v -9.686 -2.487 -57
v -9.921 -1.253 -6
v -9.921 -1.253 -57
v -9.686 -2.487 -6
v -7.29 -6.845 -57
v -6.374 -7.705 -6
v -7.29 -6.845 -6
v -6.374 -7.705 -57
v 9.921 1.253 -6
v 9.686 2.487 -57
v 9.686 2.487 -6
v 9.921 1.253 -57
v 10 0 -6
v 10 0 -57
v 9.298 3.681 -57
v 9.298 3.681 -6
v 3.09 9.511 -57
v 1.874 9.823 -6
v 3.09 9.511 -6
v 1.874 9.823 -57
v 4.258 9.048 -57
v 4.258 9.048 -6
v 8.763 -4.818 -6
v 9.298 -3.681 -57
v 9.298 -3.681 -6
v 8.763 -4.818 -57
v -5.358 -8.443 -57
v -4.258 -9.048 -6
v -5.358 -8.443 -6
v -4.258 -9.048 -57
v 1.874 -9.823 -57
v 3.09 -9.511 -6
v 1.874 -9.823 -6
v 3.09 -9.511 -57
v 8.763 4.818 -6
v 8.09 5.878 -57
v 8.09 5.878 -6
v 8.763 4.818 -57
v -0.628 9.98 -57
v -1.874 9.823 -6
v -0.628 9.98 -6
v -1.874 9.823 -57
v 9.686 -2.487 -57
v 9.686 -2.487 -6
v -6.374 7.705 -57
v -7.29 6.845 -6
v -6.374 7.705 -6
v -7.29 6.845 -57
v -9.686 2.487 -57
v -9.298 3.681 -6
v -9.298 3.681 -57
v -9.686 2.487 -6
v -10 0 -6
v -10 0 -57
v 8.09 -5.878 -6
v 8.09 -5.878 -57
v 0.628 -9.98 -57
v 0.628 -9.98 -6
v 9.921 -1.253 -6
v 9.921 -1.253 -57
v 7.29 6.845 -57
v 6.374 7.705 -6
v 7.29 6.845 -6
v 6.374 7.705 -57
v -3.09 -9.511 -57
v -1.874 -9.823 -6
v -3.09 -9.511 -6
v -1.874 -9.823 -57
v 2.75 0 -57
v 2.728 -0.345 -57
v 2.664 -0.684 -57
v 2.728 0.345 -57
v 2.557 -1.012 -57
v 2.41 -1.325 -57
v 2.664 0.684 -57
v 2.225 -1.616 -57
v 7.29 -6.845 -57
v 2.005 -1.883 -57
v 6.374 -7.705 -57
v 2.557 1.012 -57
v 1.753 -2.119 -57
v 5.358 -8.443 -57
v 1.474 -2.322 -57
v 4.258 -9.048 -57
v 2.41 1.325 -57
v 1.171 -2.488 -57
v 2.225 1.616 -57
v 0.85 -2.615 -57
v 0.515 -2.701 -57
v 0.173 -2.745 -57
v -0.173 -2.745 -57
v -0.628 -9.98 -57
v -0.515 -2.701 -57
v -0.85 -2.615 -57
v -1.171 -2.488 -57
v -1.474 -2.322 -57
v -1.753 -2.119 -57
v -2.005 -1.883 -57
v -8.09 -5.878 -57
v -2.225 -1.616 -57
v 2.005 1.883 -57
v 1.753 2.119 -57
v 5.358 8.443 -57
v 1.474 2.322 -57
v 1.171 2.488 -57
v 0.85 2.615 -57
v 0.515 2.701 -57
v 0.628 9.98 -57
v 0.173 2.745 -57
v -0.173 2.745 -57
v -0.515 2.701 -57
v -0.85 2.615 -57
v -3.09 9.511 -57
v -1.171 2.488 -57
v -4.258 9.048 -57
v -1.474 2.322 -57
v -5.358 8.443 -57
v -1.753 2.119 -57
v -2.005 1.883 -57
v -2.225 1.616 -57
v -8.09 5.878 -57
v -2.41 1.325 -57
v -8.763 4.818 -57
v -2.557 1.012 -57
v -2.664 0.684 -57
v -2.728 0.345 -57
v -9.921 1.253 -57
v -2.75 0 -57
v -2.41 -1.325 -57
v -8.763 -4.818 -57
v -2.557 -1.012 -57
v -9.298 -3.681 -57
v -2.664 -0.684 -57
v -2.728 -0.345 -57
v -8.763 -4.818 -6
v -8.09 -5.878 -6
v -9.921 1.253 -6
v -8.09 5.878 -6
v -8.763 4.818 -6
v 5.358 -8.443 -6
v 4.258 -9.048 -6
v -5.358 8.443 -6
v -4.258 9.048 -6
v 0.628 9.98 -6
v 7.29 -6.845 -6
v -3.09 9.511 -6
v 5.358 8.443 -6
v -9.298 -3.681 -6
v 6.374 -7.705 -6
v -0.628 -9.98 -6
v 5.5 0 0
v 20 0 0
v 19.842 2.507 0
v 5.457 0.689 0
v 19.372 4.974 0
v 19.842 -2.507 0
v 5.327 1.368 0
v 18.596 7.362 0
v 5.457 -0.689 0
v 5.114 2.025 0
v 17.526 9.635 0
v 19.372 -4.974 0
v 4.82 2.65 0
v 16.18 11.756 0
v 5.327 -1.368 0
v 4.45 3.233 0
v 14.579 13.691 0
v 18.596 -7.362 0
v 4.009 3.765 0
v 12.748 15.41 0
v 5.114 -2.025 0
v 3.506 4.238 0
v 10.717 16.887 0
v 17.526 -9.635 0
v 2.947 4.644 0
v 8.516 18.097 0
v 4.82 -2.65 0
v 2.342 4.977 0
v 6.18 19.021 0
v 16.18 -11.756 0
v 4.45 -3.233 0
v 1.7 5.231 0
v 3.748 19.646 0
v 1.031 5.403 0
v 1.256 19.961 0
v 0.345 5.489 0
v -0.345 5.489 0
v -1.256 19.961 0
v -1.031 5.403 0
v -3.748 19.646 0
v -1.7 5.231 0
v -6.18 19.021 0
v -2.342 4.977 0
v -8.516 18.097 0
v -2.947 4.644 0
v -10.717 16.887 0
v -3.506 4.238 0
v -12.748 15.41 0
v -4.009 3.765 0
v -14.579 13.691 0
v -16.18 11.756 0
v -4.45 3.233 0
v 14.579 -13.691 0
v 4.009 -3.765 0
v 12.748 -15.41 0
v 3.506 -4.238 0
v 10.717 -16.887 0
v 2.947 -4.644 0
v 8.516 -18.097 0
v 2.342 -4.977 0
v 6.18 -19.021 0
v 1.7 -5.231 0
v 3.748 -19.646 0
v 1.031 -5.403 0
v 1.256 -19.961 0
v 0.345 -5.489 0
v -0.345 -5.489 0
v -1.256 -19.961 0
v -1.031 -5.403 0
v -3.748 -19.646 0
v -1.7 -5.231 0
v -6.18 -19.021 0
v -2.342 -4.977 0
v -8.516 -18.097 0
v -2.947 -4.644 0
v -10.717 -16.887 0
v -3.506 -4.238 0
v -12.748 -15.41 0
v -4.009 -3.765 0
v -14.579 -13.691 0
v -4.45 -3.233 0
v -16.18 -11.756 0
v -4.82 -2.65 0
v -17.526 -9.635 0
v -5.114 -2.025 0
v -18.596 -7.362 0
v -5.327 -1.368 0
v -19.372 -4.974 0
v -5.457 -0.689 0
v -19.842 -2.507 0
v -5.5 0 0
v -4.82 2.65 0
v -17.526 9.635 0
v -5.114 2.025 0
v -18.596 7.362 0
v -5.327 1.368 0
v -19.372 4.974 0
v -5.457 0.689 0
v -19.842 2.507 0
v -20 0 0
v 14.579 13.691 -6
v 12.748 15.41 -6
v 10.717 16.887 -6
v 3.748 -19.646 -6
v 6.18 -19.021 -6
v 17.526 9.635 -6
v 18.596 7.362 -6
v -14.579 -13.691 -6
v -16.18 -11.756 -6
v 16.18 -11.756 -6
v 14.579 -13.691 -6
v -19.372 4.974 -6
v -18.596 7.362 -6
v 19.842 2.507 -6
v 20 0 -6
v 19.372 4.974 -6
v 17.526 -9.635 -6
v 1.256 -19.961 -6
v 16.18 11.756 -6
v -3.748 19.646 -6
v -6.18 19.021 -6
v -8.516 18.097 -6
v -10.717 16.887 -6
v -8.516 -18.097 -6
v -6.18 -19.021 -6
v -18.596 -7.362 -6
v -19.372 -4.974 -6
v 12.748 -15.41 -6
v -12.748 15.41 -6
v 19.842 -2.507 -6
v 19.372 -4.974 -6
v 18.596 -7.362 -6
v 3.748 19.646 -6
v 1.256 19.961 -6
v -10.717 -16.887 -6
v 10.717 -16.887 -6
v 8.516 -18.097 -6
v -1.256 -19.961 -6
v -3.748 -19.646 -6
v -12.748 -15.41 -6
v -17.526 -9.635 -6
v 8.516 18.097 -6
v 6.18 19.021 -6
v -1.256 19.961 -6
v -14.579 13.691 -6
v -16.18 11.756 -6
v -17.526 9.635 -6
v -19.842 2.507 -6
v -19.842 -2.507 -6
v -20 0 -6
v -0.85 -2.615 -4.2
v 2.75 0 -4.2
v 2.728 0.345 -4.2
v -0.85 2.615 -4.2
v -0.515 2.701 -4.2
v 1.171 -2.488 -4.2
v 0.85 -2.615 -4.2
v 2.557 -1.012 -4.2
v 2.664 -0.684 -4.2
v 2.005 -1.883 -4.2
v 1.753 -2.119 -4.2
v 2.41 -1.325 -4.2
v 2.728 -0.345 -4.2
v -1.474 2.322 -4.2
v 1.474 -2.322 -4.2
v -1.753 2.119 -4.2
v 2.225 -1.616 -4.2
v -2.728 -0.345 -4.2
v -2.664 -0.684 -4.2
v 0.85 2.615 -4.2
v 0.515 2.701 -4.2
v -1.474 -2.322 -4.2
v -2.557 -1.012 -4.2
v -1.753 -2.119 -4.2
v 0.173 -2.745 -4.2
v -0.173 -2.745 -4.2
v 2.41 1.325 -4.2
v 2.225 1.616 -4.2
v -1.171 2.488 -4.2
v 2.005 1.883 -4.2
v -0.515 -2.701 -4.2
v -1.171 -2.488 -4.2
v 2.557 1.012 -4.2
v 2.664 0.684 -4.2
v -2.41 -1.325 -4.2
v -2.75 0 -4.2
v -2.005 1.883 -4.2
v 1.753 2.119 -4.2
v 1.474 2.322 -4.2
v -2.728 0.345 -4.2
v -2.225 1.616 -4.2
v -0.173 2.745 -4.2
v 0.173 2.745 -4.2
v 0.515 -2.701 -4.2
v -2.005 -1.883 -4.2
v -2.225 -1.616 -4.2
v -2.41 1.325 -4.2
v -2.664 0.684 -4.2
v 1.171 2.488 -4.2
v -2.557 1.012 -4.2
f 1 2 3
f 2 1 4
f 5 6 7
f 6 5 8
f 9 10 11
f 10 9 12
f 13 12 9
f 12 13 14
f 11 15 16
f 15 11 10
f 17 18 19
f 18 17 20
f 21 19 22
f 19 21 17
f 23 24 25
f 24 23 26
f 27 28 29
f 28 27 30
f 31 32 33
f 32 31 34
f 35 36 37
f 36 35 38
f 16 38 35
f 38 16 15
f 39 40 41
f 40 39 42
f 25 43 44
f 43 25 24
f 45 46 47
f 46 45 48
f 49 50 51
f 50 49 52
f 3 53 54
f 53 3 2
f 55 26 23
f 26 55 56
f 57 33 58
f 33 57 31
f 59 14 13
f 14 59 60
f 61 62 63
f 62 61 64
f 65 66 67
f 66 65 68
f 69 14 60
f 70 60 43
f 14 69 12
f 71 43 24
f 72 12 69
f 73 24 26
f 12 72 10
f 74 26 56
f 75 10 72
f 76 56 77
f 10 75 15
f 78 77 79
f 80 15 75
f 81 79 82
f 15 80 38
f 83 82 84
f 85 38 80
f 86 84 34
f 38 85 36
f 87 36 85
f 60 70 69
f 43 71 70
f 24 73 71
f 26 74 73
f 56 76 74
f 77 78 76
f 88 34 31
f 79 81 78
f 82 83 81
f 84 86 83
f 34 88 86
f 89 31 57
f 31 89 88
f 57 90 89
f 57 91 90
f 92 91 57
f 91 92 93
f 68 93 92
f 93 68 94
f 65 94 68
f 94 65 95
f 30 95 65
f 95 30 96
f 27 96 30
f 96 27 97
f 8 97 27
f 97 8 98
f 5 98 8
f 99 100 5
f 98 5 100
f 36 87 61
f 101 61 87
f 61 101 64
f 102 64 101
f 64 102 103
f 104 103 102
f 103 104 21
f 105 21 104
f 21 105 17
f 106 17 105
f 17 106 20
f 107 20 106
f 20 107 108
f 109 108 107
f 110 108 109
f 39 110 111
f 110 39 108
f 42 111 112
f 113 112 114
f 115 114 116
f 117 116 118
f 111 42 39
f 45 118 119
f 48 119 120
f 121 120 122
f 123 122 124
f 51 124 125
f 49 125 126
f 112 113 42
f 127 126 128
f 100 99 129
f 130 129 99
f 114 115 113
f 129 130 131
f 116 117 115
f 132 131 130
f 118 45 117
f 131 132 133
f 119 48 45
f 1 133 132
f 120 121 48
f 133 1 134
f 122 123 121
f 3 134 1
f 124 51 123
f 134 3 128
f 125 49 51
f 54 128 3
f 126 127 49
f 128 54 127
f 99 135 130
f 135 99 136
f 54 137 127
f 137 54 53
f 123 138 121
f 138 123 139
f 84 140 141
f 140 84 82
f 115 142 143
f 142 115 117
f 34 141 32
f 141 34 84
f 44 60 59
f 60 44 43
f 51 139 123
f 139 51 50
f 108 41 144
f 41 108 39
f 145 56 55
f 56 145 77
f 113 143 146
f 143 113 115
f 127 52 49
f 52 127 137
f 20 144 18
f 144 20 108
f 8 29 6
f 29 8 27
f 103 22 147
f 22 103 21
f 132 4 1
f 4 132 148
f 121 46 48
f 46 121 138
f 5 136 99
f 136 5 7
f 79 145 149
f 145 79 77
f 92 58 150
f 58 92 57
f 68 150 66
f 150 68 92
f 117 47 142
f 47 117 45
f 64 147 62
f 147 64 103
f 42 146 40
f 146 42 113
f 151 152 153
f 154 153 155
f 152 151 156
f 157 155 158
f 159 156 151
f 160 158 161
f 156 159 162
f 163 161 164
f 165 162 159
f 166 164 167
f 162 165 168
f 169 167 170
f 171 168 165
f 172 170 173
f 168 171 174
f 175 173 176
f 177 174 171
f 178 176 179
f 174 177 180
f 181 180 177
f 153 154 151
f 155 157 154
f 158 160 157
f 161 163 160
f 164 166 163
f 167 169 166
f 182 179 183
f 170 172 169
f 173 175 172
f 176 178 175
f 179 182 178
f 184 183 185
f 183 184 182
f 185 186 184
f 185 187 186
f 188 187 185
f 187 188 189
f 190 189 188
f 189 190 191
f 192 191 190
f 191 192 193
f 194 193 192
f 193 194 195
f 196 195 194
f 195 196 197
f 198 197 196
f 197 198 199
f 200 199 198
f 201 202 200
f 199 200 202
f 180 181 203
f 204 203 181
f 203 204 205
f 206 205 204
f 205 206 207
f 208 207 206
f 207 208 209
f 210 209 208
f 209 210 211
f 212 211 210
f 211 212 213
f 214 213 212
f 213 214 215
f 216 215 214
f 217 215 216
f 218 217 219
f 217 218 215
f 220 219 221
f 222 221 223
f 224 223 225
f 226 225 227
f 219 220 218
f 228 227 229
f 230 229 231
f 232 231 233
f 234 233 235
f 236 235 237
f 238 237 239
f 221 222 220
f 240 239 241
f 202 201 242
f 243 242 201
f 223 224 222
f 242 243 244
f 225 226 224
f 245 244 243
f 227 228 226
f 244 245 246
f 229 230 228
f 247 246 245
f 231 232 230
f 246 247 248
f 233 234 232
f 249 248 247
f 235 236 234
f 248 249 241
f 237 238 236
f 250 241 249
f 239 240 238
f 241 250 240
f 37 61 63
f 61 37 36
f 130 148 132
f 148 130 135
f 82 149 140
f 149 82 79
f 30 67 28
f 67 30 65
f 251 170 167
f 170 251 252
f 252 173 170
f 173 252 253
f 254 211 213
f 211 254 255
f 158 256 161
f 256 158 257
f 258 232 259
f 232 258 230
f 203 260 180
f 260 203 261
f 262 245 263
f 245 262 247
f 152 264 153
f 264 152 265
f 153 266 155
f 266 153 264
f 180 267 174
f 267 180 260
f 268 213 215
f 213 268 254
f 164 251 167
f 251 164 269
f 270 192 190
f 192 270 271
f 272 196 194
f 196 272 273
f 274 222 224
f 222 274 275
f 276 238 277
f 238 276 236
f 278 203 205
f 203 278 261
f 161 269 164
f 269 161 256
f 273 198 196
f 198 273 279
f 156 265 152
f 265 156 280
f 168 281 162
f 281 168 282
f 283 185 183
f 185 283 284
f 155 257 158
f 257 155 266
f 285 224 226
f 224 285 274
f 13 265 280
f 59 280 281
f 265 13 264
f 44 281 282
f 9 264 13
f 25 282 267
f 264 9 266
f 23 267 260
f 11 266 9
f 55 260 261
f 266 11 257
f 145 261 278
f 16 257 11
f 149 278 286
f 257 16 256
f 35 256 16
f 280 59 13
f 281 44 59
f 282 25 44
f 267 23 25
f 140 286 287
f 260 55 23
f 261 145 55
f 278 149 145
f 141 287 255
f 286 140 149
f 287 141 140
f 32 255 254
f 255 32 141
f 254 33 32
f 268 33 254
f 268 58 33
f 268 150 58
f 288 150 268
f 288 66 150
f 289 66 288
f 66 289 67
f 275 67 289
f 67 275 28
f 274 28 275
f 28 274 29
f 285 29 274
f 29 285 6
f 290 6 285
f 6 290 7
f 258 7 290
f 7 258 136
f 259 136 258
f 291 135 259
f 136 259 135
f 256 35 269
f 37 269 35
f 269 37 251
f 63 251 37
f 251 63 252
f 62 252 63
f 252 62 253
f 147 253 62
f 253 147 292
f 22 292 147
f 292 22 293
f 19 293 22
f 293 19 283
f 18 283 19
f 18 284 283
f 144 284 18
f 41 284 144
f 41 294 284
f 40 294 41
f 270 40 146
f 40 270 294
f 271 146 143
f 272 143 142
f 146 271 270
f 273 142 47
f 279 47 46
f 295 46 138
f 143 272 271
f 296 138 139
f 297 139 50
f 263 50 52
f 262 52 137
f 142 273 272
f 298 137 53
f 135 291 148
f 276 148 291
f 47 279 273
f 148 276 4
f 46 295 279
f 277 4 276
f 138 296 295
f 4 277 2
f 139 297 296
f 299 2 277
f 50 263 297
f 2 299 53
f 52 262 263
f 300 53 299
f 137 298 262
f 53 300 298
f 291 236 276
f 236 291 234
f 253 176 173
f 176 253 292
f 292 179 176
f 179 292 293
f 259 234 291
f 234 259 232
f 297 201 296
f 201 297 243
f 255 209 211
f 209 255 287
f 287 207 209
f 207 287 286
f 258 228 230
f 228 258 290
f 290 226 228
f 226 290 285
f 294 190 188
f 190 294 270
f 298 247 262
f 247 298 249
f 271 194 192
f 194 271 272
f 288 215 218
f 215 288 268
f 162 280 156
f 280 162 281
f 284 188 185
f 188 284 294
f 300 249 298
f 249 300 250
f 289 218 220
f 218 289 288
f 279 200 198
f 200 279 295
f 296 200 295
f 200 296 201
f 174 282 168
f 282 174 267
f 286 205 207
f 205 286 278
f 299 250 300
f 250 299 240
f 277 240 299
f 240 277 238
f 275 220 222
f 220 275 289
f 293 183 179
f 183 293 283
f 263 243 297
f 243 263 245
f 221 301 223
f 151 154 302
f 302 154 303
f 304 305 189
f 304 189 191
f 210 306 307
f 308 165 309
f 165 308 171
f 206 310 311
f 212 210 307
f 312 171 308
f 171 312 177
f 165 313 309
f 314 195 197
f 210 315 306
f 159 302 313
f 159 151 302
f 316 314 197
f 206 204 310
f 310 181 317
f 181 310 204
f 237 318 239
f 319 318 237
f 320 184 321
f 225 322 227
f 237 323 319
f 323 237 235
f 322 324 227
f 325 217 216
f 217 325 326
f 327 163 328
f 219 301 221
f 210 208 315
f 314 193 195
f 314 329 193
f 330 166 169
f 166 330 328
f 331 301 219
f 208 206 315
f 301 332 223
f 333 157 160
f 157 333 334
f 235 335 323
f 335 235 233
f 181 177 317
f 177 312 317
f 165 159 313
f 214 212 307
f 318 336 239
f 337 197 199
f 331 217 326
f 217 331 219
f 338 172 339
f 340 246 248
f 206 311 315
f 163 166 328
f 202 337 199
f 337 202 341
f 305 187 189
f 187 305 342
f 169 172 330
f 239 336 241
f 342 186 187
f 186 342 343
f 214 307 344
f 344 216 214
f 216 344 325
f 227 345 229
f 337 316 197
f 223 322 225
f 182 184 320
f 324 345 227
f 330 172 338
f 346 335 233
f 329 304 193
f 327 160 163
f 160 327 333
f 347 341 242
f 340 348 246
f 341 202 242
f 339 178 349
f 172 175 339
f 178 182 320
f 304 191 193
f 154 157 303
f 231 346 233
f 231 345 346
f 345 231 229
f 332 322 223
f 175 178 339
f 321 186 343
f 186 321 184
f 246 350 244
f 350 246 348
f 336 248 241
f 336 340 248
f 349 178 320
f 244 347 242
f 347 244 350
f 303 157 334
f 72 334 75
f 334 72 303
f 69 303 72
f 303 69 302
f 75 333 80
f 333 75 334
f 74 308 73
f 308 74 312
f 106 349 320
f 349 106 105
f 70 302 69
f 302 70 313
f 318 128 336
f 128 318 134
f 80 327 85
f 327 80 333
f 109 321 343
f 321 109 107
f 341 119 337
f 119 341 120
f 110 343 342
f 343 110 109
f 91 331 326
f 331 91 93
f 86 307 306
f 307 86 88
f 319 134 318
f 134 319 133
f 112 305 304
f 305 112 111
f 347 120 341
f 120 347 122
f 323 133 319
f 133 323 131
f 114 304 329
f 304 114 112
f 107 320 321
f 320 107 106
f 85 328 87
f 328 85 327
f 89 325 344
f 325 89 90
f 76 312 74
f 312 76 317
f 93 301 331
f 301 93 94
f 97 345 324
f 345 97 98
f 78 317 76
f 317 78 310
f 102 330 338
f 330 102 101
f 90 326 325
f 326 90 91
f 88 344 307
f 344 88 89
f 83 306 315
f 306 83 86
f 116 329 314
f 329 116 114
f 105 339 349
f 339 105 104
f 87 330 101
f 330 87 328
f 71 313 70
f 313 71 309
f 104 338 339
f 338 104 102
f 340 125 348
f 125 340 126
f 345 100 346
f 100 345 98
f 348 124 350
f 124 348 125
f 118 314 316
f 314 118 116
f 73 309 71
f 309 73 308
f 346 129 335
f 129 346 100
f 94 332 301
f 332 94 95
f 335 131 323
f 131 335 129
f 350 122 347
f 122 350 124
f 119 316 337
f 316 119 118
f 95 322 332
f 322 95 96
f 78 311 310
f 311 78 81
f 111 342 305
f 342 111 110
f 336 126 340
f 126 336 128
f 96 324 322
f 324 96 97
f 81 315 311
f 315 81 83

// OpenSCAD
$fn = 50;


difference() {
	union() {
		translate(v = [0, 0, -57.0000000000]) {
			cylinder(h = 57, r = 10.0000000000);
		}
		translate(v = [0, 0, -6.0000000000]) {
			cylinder(h = 6, r = 20.0000000000);
		}
	}
	union() {
		translate(v = [0, 0, 0]) {
			rotate(a = [0, 0, 0]) {
				difference() {
					union() {
						#translate(v = [0, 0, -57.0000000000]) {
							cylinder(h = 57, r = 2.2500000000);
						}
						#translate(v = [0, 0, -4.2000000000]) {
							cylinder(h = 4.2000000000, r = 10.0000000000, r1 = 2.7500000000, r2 = 5.5000000000);
						}
						#translate(v = [0, 0, -57.0000000000]) {
							cylinder(h = 57, r = 2.7500000000);
						}
						#translate(v = [0, 0, -57.0000000000]) {
							cylinder(h = 57, r = 2.2500000000);
						}
					}
					union();
				}
			}
		}
	}
}
